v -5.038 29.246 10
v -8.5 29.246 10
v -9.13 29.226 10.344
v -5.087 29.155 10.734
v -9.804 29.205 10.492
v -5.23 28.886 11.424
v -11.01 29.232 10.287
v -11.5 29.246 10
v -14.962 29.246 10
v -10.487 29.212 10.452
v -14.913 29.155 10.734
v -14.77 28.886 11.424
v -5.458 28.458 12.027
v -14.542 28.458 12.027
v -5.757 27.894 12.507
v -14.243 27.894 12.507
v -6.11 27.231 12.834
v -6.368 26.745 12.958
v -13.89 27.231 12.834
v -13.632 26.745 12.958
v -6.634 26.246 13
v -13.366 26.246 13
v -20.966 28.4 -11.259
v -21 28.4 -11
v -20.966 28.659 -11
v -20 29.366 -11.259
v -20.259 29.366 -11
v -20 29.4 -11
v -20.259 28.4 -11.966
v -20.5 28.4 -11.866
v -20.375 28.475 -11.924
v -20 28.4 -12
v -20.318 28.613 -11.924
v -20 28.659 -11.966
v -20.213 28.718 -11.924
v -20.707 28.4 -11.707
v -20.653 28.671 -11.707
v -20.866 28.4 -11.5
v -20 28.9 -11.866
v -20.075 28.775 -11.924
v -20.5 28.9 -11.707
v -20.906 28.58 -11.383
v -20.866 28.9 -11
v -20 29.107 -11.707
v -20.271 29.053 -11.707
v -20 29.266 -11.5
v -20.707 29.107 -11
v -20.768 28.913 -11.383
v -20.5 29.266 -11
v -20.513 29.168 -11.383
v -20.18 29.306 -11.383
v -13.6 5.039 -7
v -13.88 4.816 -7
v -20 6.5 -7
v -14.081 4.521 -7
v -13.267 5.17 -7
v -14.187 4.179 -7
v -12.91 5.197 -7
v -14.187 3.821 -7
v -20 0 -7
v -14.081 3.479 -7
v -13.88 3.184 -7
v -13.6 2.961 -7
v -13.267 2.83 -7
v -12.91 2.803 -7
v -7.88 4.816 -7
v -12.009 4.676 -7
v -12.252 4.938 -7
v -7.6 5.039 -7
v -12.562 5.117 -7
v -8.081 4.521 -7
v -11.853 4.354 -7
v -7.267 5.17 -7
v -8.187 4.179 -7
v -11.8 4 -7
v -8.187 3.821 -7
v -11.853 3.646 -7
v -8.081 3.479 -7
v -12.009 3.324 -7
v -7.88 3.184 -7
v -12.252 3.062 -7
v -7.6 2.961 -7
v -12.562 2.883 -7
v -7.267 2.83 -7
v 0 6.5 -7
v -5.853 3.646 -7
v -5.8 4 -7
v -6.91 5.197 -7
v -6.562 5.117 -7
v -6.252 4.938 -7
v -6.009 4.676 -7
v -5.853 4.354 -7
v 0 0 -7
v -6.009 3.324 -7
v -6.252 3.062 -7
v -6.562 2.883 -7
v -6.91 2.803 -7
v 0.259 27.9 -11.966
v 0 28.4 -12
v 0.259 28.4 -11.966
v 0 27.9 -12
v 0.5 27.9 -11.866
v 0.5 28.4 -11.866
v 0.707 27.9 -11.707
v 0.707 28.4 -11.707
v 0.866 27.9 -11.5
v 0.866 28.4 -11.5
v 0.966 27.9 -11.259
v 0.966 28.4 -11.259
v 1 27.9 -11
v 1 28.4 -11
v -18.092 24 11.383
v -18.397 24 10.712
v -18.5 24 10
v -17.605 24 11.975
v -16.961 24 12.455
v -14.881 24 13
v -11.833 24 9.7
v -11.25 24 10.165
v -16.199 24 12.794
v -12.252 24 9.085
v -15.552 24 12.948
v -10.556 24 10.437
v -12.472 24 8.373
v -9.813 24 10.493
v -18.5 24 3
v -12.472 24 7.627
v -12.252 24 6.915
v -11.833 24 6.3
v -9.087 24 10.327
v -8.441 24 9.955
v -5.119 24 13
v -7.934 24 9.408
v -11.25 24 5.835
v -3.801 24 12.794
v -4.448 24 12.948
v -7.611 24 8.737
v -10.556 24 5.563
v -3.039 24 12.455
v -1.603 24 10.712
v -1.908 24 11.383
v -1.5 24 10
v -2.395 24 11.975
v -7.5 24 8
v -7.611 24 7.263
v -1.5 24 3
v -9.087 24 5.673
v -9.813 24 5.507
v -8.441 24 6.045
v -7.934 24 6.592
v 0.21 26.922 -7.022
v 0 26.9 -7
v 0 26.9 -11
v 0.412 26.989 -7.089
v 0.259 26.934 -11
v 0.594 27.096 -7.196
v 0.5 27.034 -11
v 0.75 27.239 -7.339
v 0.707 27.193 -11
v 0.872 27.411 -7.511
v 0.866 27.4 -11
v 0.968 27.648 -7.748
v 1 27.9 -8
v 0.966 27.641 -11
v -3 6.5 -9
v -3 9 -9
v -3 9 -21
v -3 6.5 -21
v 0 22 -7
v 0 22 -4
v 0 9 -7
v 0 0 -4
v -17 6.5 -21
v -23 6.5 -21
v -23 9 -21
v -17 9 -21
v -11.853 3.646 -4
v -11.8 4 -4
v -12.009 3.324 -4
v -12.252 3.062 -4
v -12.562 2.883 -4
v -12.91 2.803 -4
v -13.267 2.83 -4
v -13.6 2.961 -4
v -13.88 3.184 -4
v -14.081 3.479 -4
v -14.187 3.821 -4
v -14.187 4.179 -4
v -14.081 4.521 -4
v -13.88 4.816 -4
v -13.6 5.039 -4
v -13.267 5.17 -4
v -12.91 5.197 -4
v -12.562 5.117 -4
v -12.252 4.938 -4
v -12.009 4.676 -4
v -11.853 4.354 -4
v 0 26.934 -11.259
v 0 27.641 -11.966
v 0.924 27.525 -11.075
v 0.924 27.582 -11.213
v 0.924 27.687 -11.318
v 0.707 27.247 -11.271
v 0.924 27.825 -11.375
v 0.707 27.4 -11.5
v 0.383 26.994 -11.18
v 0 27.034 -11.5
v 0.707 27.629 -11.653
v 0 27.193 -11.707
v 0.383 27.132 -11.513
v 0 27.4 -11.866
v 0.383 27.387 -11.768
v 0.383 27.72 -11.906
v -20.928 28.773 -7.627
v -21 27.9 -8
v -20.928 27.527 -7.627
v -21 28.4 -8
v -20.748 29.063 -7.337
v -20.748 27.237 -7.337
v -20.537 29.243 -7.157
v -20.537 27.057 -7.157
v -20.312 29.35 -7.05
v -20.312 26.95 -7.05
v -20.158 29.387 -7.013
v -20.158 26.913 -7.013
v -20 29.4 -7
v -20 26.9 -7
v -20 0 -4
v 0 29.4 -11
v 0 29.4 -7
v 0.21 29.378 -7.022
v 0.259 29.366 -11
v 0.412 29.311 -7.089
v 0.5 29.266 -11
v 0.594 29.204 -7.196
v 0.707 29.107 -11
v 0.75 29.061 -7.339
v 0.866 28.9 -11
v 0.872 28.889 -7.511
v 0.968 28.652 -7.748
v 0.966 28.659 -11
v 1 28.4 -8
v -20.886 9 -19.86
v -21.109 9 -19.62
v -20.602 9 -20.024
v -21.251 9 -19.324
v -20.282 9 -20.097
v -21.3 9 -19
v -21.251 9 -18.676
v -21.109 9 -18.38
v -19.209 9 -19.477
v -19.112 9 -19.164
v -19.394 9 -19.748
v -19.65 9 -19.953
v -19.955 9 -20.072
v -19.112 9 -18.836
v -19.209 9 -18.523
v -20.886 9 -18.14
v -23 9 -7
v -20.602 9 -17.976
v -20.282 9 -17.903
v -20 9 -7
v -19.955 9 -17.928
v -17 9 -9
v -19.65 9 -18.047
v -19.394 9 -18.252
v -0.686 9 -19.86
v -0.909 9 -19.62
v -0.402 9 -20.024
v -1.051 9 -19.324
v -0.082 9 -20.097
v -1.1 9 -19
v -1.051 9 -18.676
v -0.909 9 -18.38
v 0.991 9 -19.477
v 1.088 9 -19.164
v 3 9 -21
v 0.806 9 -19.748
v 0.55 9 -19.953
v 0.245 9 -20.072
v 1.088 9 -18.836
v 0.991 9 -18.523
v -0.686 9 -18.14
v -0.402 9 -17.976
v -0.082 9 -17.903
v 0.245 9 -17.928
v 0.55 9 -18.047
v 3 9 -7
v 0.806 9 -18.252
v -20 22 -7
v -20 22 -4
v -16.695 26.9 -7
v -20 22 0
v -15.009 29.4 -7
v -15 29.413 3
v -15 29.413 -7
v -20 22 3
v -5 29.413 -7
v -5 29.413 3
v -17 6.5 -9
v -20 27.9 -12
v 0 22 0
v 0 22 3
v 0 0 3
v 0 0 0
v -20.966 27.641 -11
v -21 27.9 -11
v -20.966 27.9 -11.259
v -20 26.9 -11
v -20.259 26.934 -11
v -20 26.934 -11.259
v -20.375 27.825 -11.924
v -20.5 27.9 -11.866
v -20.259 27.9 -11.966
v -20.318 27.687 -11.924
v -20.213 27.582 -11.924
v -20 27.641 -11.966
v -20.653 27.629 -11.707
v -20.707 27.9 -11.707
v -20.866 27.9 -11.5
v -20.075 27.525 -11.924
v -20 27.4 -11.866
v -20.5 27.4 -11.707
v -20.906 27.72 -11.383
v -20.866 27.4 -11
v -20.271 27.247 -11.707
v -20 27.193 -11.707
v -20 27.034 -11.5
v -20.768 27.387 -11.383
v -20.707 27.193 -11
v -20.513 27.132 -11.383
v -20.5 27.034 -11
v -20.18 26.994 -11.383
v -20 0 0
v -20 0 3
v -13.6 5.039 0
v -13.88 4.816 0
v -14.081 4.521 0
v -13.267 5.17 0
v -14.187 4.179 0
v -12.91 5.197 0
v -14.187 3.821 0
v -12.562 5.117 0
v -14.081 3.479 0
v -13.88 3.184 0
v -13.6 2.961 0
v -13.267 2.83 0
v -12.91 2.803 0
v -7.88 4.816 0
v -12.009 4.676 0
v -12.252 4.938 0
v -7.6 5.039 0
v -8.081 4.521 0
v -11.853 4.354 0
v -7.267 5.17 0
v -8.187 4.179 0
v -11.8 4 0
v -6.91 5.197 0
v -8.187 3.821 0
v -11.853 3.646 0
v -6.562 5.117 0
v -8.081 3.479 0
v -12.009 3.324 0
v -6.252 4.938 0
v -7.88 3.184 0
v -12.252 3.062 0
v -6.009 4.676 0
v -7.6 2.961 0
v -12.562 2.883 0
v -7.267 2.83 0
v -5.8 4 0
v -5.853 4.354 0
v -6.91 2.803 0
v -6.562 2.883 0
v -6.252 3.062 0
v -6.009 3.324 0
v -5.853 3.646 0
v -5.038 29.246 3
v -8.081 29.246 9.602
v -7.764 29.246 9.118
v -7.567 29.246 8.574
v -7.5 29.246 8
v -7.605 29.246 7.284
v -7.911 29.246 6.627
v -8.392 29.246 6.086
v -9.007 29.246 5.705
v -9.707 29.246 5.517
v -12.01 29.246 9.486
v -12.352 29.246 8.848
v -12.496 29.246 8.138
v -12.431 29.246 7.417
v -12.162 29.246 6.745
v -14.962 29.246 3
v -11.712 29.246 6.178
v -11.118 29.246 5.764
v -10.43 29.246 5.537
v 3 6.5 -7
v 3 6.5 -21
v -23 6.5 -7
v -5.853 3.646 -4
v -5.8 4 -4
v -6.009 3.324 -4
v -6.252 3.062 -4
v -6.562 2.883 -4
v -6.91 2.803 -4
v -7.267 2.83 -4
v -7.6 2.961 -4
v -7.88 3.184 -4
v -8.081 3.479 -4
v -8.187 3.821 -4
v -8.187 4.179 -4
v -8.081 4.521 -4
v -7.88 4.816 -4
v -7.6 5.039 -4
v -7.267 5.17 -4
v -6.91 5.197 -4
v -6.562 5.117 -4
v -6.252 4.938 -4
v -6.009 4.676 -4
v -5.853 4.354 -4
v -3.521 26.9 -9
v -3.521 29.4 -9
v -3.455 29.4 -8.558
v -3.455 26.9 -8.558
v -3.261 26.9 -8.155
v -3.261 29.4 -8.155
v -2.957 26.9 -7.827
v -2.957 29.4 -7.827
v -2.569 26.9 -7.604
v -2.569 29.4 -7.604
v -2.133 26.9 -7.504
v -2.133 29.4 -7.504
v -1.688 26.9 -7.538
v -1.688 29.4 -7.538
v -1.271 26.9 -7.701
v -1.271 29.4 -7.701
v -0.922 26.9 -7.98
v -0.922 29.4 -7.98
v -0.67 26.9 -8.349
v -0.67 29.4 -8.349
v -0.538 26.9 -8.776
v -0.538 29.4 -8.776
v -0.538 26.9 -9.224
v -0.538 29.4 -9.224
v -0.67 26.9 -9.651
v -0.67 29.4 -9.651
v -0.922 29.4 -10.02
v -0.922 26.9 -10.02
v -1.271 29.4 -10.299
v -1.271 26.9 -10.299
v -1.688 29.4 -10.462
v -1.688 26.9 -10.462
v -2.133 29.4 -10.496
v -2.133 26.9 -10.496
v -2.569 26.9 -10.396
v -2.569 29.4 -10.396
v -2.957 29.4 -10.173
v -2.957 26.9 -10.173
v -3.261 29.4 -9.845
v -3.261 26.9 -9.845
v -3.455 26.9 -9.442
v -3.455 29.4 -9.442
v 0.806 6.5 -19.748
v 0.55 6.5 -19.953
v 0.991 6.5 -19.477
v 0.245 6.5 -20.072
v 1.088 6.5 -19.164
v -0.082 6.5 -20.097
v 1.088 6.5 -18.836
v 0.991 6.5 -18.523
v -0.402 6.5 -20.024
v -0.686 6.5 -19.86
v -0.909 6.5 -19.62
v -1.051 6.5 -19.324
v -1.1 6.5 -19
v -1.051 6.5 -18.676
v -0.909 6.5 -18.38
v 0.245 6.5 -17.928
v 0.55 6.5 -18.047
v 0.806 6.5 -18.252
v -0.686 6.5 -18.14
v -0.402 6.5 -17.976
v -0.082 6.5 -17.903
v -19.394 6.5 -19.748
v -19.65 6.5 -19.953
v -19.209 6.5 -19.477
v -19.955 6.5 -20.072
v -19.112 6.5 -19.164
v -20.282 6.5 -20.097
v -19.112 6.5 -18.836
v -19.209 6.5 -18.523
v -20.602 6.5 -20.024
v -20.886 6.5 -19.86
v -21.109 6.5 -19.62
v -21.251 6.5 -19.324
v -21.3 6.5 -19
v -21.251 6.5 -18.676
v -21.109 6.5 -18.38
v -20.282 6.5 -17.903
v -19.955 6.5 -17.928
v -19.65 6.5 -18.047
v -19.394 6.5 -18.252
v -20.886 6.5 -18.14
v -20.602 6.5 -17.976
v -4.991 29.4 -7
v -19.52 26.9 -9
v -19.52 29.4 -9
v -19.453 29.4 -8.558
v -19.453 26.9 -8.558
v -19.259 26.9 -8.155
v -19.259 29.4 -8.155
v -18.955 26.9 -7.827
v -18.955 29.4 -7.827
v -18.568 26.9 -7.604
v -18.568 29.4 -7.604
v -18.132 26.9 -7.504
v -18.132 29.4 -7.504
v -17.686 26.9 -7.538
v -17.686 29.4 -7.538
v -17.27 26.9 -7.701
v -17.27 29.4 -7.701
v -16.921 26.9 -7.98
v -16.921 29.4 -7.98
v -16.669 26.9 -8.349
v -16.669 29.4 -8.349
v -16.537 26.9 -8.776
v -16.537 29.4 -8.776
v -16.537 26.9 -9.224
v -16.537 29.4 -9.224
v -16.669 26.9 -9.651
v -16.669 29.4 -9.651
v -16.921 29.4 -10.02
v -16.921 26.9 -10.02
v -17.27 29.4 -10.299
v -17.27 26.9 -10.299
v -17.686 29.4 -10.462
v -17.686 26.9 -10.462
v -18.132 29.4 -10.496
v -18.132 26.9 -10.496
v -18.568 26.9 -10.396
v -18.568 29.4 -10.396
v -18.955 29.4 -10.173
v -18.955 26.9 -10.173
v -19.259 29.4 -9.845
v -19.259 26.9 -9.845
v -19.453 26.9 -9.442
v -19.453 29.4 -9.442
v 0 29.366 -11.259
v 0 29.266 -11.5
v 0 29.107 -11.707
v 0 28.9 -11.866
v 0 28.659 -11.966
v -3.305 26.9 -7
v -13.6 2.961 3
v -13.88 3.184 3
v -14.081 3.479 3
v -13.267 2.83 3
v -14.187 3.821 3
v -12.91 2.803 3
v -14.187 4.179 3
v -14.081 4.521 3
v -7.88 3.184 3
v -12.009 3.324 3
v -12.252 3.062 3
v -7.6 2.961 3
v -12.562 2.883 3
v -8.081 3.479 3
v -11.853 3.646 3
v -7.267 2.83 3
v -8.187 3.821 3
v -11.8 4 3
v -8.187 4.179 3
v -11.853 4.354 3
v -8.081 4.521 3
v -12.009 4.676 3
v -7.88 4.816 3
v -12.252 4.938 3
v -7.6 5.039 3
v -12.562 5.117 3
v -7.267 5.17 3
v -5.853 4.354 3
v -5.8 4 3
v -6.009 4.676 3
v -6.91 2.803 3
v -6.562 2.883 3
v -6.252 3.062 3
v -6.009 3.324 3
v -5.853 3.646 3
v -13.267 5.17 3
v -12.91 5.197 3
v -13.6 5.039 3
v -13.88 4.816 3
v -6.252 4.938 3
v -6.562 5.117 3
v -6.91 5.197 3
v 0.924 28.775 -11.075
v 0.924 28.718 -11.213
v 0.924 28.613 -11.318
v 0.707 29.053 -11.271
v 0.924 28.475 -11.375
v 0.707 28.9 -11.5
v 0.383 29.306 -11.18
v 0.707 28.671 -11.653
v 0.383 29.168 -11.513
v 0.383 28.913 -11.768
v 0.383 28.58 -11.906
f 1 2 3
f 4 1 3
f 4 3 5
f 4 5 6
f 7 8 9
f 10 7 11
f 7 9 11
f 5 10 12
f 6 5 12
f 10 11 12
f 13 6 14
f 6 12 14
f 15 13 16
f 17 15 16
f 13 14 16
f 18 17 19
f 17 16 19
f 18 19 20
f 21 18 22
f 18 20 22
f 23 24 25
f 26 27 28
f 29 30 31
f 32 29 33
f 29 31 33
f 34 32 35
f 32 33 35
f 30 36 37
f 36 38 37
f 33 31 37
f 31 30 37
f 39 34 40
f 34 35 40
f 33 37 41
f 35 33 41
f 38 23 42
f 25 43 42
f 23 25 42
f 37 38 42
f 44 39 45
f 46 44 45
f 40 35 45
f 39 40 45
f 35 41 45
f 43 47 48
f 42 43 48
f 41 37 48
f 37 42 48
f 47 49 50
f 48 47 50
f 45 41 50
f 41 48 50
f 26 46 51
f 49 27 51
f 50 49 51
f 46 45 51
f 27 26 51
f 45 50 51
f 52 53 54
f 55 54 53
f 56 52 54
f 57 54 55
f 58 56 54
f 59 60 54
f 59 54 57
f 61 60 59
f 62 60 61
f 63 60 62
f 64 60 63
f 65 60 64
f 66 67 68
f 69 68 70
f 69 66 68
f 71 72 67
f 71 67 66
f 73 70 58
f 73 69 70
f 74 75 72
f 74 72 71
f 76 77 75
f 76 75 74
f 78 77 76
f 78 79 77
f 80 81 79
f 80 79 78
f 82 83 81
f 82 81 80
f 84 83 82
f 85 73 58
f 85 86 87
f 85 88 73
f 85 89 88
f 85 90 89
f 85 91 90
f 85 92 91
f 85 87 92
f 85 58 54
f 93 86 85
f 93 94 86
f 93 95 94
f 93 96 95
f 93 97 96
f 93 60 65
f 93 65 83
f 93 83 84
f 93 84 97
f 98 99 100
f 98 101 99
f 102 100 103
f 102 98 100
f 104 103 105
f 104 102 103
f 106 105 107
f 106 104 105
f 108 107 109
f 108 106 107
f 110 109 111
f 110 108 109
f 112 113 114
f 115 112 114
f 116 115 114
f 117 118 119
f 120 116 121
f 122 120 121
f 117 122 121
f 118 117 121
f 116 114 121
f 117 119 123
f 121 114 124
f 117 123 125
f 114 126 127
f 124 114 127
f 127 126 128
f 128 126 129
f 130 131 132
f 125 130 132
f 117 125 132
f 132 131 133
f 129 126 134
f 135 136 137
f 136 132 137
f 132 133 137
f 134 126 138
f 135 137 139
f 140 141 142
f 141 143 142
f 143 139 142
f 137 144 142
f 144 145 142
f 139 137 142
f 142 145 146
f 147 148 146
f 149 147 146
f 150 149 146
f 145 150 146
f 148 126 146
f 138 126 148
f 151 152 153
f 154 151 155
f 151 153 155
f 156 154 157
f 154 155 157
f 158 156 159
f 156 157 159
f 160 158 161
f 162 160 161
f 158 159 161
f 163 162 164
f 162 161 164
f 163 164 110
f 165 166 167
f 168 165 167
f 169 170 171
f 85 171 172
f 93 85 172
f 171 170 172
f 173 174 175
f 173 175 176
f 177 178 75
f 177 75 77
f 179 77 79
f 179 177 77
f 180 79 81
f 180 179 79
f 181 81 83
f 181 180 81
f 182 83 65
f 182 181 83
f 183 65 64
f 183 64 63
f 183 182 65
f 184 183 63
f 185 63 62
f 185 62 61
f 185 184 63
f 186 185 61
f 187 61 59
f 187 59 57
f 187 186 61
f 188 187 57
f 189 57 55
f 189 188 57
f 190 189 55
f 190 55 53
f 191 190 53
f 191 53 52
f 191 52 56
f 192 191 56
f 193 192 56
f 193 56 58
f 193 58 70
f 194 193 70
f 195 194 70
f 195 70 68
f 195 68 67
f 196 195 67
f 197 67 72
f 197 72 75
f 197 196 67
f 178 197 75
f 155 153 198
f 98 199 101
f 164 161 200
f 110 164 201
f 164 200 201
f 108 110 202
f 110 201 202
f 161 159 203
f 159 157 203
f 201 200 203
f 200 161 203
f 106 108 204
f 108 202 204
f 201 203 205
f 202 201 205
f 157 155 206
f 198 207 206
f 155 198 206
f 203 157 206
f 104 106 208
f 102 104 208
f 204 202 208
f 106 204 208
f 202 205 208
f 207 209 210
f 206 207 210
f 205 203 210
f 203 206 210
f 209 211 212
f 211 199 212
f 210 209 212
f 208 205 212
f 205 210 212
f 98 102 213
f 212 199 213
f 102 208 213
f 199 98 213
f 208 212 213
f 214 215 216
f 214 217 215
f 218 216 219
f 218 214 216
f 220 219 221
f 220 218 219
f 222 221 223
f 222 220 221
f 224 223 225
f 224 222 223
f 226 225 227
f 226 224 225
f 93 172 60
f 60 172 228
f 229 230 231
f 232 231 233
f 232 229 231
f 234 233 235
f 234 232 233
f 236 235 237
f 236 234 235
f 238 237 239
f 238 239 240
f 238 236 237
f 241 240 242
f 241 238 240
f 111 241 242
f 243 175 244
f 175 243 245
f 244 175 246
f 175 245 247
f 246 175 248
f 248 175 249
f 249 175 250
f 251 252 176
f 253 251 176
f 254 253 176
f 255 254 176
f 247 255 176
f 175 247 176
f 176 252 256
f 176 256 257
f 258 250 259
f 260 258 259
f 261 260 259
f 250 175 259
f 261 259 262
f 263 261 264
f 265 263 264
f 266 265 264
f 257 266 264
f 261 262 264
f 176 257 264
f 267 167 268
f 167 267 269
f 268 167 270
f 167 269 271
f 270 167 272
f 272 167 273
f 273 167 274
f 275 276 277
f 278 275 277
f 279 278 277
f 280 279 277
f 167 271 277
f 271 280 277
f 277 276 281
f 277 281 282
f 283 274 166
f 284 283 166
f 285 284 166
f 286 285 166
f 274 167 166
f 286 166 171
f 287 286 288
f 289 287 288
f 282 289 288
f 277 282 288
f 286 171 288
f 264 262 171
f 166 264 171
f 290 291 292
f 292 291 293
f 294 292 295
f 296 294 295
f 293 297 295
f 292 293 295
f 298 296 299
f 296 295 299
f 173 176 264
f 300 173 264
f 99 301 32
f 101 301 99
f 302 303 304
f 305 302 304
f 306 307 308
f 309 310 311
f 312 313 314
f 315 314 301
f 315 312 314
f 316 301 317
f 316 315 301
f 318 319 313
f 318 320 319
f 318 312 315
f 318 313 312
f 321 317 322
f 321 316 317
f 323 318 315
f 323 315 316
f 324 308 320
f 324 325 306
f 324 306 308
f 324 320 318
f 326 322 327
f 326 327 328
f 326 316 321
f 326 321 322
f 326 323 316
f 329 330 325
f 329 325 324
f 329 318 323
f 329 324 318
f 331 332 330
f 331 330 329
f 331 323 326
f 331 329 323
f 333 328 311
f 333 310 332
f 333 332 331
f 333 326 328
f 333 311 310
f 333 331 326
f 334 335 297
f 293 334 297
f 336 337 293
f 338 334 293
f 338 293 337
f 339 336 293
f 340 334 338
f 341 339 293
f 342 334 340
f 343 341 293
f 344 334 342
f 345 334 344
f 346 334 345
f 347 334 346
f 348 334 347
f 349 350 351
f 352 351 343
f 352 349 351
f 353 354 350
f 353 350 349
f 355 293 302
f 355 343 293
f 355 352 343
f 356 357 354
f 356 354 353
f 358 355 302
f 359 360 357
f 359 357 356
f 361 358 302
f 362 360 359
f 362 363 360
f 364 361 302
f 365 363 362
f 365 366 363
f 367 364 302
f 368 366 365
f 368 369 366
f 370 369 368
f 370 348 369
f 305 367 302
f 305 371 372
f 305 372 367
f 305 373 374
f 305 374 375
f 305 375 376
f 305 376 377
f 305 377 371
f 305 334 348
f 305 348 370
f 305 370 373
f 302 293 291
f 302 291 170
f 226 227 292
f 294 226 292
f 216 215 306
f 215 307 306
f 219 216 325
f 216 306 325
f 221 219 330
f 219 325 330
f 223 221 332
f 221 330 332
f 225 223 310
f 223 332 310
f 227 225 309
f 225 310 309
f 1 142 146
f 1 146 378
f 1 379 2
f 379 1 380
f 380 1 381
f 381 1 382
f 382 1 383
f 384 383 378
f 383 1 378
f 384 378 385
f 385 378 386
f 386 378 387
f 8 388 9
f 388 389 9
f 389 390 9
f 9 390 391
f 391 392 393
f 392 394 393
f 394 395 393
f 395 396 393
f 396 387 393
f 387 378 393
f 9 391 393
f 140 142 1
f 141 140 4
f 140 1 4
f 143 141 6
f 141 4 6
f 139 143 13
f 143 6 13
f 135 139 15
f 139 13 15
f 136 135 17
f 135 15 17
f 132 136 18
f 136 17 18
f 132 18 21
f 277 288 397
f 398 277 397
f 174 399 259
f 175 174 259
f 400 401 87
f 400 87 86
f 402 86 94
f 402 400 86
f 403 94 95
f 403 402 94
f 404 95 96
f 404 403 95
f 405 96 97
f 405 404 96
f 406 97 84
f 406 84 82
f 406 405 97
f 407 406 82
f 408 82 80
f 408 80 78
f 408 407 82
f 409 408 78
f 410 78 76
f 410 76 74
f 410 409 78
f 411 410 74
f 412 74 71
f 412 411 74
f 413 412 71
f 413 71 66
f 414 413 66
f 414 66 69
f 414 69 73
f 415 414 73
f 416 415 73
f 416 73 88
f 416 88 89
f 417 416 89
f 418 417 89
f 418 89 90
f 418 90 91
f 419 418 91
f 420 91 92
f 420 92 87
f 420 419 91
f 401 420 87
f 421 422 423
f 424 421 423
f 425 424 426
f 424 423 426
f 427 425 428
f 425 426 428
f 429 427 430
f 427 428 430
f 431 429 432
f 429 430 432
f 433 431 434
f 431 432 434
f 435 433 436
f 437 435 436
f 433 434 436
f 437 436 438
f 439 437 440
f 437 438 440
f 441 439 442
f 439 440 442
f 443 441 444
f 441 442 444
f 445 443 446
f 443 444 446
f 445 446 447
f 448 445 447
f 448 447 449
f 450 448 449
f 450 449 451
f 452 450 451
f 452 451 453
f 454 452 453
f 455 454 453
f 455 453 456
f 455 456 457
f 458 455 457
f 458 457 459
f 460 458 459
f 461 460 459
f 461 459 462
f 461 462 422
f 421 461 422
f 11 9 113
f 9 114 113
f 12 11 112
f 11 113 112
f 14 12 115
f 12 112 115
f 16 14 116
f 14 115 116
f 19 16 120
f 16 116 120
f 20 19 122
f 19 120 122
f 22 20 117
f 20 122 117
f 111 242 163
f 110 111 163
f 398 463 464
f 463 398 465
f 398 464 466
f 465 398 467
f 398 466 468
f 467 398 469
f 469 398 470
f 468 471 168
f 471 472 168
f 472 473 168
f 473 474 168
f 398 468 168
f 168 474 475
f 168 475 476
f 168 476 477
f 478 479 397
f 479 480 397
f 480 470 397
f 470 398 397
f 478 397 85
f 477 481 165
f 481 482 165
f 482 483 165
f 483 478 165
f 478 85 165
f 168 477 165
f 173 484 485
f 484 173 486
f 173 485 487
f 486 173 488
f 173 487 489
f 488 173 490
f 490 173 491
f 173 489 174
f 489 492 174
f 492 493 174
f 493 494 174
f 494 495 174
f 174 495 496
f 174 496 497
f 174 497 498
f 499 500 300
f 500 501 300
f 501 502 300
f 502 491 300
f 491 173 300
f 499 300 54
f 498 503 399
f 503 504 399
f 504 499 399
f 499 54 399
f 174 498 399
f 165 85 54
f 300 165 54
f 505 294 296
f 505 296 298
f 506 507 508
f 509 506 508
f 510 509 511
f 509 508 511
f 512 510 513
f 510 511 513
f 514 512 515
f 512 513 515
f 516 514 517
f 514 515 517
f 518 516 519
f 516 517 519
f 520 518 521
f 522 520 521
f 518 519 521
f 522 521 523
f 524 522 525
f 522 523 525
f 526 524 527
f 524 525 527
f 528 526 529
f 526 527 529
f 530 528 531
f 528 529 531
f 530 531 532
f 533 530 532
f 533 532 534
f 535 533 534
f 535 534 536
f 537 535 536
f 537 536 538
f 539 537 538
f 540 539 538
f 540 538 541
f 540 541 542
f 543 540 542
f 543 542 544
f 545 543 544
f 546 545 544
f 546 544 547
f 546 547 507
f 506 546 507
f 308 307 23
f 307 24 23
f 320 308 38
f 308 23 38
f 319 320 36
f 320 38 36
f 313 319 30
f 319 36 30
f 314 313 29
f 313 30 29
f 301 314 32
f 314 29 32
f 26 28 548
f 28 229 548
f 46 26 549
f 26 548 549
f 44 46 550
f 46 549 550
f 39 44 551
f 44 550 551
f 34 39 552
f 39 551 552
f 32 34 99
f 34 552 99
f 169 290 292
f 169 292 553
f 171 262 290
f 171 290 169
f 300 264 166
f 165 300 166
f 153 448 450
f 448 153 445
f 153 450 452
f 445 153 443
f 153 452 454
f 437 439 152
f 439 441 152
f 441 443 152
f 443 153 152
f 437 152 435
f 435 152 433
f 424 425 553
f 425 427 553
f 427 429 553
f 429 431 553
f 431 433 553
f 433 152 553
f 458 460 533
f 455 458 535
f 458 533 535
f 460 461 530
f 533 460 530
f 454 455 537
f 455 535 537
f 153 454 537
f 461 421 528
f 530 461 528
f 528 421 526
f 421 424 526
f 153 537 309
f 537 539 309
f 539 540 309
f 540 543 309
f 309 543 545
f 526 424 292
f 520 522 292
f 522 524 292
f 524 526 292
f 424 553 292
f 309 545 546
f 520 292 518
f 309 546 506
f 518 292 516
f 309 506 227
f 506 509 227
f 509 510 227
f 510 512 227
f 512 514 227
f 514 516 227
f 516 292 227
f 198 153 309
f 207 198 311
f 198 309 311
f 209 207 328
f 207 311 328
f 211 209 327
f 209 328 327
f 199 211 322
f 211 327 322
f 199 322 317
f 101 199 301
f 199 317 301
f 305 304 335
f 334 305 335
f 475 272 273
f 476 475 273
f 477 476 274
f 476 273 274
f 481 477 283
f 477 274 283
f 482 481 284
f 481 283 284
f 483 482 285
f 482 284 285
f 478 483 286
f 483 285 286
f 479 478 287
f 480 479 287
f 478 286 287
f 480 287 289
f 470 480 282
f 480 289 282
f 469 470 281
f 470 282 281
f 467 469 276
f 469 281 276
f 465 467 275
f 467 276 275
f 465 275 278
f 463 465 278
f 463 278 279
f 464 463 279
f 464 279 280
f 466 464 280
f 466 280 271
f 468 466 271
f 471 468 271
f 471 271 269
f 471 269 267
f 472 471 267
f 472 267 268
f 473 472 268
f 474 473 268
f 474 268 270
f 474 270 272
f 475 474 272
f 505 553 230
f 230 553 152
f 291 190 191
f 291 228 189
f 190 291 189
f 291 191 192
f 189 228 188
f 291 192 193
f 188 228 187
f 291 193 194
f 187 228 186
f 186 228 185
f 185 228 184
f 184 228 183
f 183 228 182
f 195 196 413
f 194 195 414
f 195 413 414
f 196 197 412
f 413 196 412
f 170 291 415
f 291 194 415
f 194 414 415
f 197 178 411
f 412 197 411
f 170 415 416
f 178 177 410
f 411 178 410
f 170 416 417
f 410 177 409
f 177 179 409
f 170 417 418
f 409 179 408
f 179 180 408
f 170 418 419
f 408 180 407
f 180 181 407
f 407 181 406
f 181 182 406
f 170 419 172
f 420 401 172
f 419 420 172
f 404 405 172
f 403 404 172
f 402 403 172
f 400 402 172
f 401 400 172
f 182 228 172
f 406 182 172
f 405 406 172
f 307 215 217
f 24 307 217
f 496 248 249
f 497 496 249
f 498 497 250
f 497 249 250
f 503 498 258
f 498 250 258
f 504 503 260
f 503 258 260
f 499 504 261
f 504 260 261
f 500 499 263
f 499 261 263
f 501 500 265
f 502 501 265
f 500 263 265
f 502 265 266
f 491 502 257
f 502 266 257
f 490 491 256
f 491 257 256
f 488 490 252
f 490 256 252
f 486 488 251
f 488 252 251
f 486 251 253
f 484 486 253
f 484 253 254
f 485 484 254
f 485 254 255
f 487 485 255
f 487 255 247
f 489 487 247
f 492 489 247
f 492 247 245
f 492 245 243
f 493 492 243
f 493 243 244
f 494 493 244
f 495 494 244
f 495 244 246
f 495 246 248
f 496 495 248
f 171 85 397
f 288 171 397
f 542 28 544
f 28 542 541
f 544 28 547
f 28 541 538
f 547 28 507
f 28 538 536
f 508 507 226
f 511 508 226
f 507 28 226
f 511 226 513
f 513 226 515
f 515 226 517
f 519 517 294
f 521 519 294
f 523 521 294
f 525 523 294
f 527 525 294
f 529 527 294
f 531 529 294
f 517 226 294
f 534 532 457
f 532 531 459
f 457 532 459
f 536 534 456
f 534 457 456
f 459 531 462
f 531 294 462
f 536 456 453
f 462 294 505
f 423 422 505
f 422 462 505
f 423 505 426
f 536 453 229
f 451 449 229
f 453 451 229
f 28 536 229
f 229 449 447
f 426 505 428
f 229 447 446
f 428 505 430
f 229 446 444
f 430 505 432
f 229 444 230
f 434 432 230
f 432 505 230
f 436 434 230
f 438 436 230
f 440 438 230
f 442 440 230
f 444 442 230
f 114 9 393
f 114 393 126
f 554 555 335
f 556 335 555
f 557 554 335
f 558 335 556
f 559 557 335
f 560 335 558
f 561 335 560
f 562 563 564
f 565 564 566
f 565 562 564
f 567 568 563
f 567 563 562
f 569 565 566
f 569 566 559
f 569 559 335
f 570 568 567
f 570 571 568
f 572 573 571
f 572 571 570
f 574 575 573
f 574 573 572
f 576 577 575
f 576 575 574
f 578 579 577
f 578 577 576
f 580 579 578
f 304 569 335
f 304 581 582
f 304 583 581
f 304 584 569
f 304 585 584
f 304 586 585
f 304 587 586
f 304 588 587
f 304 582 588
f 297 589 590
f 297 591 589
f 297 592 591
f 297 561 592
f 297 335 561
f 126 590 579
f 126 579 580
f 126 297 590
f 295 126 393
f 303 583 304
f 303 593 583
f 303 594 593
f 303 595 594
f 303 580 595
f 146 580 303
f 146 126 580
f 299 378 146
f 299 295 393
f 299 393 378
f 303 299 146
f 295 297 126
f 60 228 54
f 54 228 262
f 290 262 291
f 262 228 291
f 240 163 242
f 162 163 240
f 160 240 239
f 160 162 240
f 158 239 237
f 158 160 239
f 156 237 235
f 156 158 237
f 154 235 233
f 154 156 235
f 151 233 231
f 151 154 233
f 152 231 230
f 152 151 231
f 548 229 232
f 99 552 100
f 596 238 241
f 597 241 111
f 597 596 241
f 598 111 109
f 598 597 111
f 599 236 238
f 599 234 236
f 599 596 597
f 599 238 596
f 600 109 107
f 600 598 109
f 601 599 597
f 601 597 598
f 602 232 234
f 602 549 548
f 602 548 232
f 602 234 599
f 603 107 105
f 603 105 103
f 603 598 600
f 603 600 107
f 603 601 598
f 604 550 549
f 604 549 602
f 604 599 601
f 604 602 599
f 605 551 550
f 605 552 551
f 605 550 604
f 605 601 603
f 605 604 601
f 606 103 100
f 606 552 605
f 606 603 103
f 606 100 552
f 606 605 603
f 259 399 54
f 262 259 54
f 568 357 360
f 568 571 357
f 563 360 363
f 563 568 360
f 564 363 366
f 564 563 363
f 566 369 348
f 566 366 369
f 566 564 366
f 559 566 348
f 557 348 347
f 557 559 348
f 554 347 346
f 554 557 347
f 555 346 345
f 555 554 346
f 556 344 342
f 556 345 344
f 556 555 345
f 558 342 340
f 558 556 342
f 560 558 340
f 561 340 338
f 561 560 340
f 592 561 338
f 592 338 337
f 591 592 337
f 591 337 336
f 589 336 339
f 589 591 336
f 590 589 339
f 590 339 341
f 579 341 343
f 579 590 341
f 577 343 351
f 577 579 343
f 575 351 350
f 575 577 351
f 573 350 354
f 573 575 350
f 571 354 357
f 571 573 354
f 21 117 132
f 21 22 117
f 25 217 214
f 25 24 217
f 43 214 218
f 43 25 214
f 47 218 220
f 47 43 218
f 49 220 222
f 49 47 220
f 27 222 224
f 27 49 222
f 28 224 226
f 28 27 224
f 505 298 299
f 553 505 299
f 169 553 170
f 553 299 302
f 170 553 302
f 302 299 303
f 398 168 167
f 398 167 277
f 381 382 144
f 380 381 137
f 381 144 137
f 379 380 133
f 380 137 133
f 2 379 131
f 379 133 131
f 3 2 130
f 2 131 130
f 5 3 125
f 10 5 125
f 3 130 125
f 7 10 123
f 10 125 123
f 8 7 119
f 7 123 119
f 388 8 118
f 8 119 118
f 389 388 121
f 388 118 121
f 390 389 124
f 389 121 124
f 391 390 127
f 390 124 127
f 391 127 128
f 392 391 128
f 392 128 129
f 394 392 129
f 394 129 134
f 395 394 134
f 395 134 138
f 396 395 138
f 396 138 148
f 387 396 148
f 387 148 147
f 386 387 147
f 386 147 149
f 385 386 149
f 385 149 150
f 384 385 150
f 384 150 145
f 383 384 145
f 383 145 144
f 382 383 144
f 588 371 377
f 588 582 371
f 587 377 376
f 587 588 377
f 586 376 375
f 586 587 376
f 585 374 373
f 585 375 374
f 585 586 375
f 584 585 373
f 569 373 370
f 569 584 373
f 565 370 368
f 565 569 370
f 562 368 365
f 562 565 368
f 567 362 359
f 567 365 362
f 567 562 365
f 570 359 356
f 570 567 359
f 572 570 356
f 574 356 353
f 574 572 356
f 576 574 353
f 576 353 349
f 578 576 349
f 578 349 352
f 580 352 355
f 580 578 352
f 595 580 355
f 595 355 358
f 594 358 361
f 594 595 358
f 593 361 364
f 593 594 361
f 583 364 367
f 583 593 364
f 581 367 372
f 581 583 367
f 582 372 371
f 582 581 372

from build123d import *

# Parameters (mm, degrees)
SKETCH_R        = 1.2
PAD_DEPTH       = 3
PAD001_DEPTH    = 10
FILLET_R        = 3
SKETCH002_R     = 2.5
POCKET_DEPTH    = 6
SKETCH003_R     = 1.2
PAD002_DEPTH    = 7
SKETCH004_W     = 20
SKETCH004_H     = 4
POCKET001_DEPTH = 22
PAD003_DEPTH    = 14
SKETCH006_R     = 1.1
POCKET002_DEPTH = 3
PAD004_DEPTH    = 5
SKETCH008_R     = 1.5
POCKET003_DEPTH = 5
FILLET001_R     = 1
POCKET004_DEPTH = 5


with BuildPart() as part:
    # Sketch → Pad (new body)
    with BuildSketch(Plane.XY):
        Polygon((-20, 22), (-20, 0), (0, 0), (0, 22), (-5, 29.412805), (-15, 29.412805), align=None)
        with Locations((-7, 4)):
            Circle(SKETCH_R, mode=Mode.SUBTRACT)
        with Locations((-13, 4)):
            Circle(SKETCH_R, mode=Mode.SUBTRACT)
    extrude(amount=PAD_DEPTH)

    # Sketch001 (on Face10 of Pad) → Pad001 (join)
    with BuildSketch(Plane.XY.offset(3)):
        Polygon((-10, 24), (-1.5, 24), (-5.038419, 29.245922), (-14.961581, 29.245922), (-18.5, 24), align=None)
    extrude(amount=PAD001_DEPTH)

    # Fillet
    fillet_edges = [part.edges().sort_by_distance(p)[0] for p in [
        (-3.26921, 26.622961, 13),
        (-10, 29.245922, 13),
        (-16.73079, 26.622961, 13),
    ]]
    fillet(fillet_edges, radius=FILLET_R)

    # Sketch002 (on Face1 of Fillet) → Pocket (cut)
    with BuildSketch(Plane.XZ.offset(-24)):
        with Locations((-10, 8)):
            Circle(SKETCH002_R)
    extrude(amount=-POCKET_DEPTH, mode=Mode.SUBTRACT)

    # Sketch003 (on Face20 of Pocket) → Pad002 (join)
    with BuildSketch(Plane(origin=(0, 0, 0), x_dir=(1, 0, 0), z_dir=(0, 0, -1))):
        Polygon((0, 0), (-20, 0), (-20, -22), (-15, -29.412805), (-5, -29.412805), (0, -22), align=None)
        with Locations((-13, -4)):
            Circle(SKETCH003_R, mode=Mode.SUBTRACT)
        with Locations((-7, -4)):
            Circle(SKETCH003_R, mode=Mode.SUBTRACT)
    extrude(amount=PAD002_DEPTH)

    # Sketch004 (on Face22 of Pad002) → Pocket001 (cut)
    with BuildSketch(Plane.XZ):
        with Locations((-10, -2)):
            Rectangle(SKETCH004_W, SKETCH004_H)
    extrude(amount=-POCKET001_DEPTH, mode=Mode.SUBTRACT)

    # Sketch005 (on Face26 of Pocket001) → Pad003 (join)
    with BuildSketch(Plane(origin=(0, 0, -7), x_dir=(1, 0, 0), z_dir=(0, 0, -1))):
        Polygon((-10, -6.5), (-23, -6.5), (-23, -9), (-10, -9), (3, -9), (3, -6.5), align=None)
    extrude(amount=PAD003_DEPTH)

    # Sketch006 (on Face33 of Pad003) → Pocket002 (cut)
    with BuildSketch(Plane(origin=(0, 9, 0), x_dir=(-1, 0, 0), z_dir=(0, 1, 0))):
        with Locations((0, -19)):
            Circle(SKETCH006_R)
        with Locations((20.2, -19)):
            Circle(SKETCH006_R)
    extrude(amount=-POCKET002_DEPTH, mode=Mode.SUBTRACT)

    # Sketch007 (on Face26 of Pocket002) → Pad004 (join)
    with BuildSketch(Plane(origin=(0, 0, -7), x_dir=(1, 0, 0), z_dir=(0, 0, -1))):
        Polygon((-10, -26.9), (-21, -26.9), (-21, -29.4), (-10, -29.4), (1, -29.4), (1, -26.9), align=None)
    extrude(amount=PAD004_DEPTH)

    # Sketch008 → Pocket003 (cut)
    with BuildSketch(Plane(origin=(0, 29.4, 0), x_dir=(-1, 0, 0), z_dir=(0, 1, 0))):
        with Locations((2.021394, -9)):
            Circle(SKETCH008_R)
        with Locations((18.020098, -9)):
            Circle(SKETCH008_R)
    extrude(amount=-POCKET003_DEPTH, mode=Mode.SUBTRACT)

    # Fillet001
    fillet001_edges = [part.edges().sort_by_distance(p)[0] for p in [
        (-21, 26.9, -9.5),
        (-21, 29.4, -9.5),
        (-21, 28.15, -7),
        (-21, 28.15, -12),
        (-4.5, 29.4, -12),
        (-15.5, 29.4, -12),
        (-15.5, 26.9, -12),
        (-4.5, 26.9, -12),
        (1, 29.4, -9.5),
        (1, 26.9, -9.5),
        (1, 28.15, -12),
        (1, 28.15, -7),
    ]]
    fillet(fillet001_edges, radius=FILLET001_R)

    # Sketch009 (on Face29 of Fillet001) → Pocket004 (cut)
    with BuildSketch(Plane(origin=(0, 9, 0), x_dir=(-1, 0, 0), z_dir=(0, 1, 0))):
        Polygon((3, -15), (3, -21), (17, -21), (17, -9), (3, -9), align=None)
    extrude(amount=-POCKET004_DEPTH, mode=Mode.SUBTRACT)


solid = part.part
